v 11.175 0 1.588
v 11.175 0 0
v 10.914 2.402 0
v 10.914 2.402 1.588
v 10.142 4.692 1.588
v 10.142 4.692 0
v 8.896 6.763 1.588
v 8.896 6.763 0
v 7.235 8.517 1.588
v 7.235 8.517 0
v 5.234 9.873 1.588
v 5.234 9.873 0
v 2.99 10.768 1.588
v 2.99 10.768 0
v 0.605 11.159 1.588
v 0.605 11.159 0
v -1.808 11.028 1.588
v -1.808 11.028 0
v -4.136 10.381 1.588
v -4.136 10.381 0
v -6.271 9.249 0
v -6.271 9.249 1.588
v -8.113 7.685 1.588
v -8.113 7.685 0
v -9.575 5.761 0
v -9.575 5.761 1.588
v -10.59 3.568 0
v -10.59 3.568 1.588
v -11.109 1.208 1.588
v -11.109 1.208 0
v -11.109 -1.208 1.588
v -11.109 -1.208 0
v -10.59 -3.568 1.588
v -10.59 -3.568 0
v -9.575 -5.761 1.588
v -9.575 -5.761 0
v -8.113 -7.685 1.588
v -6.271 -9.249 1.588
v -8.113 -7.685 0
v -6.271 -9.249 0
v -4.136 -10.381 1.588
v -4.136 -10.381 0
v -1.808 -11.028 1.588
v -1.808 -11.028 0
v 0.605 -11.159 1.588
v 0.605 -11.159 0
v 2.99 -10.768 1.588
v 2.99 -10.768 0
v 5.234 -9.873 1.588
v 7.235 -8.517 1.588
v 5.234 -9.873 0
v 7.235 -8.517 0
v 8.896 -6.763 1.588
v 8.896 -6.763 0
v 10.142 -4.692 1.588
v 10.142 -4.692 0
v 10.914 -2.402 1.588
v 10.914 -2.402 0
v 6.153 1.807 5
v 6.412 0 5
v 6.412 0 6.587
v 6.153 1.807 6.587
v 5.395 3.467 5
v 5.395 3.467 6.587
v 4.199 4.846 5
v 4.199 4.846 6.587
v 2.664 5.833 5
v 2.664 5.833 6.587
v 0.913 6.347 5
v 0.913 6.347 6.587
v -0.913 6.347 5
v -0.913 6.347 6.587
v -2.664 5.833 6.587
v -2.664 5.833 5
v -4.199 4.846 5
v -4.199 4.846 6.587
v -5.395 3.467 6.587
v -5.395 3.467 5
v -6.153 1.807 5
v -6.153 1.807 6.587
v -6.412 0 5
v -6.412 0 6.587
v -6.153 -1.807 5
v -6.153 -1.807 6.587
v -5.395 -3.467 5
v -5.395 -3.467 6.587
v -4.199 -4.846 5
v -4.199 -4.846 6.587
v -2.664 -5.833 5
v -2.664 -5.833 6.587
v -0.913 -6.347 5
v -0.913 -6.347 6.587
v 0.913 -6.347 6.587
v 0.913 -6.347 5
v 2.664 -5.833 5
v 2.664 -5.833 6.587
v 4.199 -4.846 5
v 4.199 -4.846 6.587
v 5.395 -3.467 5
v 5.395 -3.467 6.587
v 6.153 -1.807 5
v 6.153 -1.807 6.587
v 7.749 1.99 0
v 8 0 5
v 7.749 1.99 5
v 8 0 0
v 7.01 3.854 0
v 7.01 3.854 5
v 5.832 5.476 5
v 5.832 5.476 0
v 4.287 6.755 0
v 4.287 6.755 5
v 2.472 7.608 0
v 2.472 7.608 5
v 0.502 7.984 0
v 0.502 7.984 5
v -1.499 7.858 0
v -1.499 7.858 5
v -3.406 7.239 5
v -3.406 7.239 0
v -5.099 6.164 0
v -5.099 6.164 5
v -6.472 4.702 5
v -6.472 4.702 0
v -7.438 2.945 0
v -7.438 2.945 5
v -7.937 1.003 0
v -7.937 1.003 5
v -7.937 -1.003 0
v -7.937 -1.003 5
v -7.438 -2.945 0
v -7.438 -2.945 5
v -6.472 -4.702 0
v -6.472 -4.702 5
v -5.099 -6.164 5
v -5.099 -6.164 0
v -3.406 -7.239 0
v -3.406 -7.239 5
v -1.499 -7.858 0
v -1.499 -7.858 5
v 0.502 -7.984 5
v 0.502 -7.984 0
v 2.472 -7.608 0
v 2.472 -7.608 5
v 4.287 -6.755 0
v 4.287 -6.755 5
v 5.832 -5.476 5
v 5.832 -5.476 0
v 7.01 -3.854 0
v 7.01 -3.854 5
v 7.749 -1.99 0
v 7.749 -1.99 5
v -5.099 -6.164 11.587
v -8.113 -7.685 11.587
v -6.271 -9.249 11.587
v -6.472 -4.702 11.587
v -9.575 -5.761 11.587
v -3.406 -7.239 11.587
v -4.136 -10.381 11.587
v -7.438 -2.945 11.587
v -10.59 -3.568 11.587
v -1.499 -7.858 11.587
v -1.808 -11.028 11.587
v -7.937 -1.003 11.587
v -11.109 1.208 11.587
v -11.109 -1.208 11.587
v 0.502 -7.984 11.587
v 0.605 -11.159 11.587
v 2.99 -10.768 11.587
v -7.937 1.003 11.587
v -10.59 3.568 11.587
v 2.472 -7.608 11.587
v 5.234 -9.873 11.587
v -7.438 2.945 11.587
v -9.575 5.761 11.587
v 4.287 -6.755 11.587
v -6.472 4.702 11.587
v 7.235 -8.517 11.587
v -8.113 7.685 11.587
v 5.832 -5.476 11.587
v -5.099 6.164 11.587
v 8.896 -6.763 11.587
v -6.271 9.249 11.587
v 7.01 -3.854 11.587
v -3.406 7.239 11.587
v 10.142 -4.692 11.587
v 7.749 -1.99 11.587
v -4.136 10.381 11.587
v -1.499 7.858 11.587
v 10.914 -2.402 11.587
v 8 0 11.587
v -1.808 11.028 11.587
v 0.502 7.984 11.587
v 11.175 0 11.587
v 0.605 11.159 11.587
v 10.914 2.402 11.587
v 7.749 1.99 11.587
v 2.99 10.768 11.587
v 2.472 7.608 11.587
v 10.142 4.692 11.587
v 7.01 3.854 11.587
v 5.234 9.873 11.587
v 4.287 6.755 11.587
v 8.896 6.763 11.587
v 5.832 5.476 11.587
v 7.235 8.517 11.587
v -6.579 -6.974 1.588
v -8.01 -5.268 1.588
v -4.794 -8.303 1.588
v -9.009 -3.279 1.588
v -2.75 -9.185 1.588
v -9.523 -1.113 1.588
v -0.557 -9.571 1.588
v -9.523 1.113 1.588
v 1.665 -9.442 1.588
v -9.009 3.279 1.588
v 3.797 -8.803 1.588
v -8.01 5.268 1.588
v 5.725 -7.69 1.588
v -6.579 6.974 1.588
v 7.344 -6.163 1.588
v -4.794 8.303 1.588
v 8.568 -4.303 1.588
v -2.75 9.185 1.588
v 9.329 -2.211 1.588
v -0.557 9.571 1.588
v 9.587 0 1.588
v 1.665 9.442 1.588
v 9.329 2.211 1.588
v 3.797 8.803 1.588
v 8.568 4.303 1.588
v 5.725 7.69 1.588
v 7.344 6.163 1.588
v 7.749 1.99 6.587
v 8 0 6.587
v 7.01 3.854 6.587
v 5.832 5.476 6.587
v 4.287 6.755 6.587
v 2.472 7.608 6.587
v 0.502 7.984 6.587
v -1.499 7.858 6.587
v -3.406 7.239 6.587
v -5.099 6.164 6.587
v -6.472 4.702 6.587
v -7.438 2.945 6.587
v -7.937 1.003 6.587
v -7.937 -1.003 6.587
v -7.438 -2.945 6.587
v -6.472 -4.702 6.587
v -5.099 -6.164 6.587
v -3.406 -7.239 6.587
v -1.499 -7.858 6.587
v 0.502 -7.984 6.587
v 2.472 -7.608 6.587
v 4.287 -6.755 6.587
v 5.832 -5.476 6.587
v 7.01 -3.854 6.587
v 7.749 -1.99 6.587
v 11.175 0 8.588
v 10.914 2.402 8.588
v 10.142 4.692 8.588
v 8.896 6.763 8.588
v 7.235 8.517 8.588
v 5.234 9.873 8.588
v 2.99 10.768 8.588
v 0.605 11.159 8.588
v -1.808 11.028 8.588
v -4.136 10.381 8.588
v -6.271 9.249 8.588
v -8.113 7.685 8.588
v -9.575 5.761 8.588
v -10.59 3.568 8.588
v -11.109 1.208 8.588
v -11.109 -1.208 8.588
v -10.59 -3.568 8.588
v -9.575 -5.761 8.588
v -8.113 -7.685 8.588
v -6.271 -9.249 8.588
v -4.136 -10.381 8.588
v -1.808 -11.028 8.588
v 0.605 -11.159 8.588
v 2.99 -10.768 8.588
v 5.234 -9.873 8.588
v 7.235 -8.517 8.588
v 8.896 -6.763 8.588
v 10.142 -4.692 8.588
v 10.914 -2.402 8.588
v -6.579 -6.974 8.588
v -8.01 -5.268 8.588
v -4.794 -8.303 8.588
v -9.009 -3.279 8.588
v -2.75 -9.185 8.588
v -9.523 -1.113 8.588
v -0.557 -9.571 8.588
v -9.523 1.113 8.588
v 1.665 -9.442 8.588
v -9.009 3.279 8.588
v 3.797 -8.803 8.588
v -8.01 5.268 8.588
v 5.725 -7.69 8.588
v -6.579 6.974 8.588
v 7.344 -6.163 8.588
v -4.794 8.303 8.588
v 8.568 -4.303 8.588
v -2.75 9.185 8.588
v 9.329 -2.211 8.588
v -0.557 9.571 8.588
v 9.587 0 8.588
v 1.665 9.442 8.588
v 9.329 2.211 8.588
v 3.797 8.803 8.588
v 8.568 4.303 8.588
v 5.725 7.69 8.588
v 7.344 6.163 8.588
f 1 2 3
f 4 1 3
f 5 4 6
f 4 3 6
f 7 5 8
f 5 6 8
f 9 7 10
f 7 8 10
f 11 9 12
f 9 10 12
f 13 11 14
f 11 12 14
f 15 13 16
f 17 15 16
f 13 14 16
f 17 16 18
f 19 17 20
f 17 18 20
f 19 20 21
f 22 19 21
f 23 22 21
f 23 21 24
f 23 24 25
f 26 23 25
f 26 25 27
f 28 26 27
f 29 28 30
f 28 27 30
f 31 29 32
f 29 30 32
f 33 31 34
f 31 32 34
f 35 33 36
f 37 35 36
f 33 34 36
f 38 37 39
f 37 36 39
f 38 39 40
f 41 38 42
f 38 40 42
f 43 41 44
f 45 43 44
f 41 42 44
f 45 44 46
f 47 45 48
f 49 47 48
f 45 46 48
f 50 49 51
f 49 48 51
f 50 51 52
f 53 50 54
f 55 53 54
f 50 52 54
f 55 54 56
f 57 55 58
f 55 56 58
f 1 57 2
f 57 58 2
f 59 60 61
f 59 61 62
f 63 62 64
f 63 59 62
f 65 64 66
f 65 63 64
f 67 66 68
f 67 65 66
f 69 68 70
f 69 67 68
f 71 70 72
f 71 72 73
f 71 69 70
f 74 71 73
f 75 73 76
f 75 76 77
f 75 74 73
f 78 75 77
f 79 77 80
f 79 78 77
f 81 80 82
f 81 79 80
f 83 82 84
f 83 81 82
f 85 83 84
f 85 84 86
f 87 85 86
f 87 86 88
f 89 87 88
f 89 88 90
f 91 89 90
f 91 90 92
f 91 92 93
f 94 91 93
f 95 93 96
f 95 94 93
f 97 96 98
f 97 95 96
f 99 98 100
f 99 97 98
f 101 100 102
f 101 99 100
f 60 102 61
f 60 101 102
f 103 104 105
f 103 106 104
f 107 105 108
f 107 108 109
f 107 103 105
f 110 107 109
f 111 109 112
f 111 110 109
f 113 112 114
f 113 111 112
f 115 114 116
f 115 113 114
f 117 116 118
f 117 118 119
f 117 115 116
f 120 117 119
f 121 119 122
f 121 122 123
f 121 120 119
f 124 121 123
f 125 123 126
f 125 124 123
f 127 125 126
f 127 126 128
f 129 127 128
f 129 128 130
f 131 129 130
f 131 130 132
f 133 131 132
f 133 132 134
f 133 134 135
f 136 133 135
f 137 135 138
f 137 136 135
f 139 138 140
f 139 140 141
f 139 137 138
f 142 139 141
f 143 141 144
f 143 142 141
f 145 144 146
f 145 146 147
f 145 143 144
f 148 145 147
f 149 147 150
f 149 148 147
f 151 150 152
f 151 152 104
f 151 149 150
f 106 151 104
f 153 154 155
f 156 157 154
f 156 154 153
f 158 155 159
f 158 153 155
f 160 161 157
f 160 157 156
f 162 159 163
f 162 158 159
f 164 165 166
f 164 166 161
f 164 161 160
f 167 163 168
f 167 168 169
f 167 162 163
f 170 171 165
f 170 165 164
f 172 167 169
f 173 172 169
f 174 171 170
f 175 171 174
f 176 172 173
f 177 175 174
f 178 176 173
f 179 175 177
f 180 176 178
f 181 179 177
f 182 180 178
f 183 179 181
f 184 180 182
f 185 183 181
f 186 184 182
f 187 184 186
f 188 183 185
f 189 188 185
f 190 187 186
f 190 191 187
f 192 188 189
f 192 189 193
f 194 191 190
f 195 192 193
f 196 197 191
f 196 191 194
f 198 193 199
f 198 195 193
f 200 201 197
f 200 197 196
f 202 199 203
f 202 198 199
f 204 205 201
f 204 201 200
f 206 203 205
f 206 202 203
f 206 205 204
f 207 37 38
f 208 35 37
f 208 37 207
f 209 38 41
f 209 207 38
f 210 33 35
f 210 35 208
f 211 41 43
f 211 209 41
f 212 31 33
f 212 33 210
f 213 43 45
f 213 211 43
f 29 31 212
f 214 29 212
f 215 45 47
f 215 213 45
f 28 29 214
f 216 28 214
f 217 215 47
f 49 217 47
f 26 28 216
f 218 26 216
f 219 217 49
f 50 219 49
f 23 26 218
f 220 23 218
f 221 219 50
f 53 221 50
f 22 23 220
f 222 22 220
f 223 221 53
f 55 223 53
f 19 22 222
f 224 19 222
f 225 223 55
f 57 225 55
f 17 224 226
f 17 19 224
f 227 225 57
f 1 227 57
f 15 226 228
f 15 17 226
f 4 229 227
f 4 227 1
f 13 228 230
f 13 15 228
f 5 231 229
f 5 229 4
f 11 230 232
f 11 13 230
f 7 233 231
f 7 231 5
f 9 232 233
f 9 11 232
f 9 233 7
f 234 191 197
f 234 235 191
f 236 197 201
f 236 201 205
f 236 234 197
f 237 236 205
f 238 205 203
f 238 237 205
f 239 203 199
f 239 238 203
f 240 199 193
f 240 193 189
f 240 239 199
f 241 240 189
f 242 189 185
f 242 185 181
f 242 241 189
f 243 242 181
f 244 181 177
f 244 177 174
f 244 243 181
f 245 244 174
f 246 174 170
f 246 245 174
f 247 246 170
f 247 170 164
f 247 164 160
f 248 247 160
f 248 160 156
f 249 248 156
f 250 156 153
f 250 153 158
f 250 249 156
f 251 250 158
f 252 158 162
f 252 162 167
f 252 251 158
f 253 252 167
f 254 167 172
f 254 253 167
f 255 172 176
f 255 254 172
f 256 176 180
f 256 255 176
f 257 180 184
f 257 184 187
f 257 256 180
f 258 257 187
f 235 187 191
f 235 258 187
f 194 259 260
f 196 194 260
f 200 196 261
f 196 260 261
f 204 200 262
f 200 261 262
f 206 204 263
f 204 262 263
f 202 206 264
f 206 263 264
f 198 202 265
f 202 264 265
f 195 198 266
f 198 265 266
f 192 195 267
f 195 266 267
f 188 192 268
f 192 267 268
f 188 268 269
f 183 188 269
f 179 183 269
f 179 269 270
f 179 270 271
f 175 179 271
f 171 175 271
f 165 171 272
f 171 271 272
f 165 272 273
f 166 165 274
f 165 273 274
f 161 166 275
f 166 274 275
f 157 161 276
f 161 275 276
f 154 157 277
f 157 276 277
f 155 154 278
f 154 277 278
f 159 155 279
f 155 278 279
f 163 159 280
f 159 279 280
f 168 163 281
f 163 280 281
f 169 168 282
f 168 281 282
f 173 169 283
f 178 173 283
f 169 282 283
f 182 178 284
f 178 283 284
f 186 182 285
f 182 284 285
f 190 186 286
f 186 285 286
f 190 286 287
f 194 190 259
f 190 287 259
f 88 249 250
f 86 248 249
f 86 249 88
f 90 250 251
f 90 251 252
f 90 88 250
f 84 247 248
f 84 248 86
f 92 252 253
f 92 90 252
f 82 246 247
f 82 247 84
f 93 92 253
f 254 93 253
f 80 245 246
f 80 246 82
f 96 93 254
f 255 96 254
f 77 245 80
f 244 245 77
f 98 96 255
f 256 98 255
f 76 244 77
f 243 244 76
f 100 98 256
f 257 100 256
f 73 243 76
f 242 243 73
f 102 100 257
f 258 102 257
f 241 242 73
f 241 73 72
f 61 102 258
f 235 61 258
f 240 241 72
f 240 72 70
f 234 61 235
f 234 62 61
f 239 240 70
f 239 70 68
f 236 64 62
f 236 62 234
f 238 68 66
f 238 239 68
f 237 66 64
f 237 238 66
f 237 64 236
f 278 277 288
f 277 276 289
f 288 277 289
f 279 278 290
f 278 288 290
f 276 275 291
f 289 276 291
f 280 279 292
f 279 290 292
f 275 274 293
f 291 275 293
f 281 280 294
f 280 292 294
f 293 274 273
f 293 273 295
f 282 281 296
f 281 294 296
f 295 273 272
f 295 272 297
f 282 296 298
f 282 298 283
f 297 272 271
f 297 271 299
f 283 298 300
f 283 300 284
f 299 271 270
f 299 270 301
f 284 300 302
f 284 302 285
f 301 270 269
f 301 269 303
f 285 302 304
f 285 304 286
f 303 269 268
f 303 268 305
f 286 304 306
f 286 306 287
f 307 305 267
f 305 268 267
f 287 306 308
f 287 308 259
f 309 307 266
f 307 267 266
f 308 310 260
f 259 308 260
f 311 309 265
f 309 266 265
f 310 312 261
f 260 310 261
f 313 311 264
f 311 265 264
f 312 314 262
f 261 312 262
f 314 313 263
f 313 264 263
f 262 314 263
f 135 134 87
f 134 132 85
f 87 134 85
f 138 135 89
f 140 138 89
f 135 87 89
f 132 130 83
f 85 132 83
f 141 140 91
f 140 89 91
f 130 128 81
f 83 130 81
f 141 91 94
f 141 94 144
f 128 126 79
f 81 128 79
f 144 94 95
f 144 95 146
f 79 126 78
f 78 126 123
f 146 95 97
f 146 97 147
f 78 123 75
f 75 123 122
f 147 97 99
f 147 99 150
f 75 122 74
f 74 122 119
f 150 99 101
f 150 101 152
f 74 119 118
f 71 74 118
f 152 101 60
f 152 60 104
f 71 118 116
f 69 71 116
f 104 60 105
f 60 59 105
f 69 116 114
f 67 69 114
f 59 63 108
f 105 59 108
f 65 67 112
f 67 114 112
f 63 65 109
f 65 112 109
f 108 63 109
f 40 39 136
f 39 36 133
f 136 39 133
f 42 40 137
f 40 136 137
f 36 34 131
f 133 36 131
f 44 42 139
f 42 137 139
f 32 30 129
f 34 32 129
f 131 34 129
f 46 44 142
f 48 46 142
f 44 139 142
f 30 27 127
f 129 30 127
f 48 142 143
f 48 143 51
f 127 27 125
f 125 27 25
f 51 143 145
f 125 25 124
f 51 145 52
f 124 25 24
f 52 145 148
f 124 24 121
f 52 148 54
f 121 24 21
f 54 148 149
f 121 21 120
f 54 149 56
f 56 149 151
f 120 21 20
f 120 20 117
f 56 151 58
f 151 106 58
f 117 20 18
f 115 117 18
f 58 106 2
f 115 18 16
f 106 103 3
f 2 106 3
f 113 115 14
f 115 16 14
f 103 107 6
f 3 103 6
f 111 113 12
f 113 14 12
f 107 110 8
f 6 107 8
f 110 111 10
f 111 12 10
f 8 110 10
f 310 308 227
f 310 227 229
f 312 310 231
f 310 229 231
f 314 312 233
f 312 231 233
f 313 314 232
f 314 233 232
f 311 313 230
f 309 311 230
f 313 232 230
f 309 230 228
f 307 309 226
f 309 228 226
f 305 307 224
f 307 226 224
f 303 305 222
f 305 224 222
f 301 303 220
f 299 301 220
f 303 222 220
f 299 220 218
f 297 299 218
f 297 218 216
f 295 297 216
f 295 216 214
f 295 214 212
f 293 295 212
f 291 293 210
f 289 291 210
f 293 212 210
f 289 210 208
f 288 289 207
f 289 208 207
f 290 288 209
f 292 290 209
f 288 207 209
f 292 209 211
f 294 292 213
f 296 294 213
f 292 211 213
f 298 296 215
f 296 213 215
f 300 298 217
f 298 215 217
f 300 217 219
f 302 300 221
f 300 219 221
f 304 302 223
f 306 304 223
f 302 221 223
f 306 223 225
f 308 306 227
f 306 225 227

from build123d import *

# Parameters (mm, degrees)
F0_R     = 11.1749967
F0_R_2   = 8
F1_DEPTH = 1.5875
F2_R     = 9.5874967
F2_R_2   = 8
F3_DEPTH = 3.41249
F4_R     = 9.5874967
F4_R_2   = 6.4124967
F5_DEPTH = 1.5875
F6_R     = 9.5874967
F6_R_2   = 8
F7_DEPTH = 2.0000214
F8_R     = 11.1749967
F8_R_2   = 8
F9_DEPTH = 2.9999686


with BuildPart() as f1:
    # F0 (on Top) → F1 (new body)
    with BuildSketch(Plane.XY):
        Circle(F0_R)
        Circle(F0_R_2, mode=Mode.SUBTRACT)
    extrude(amount=F1_DEPTH)

    # F2 (on face) → F3 (join)
    with BuildSketch(Plane.XY.offset(1.5875)):
        Circle(F2_R)
        Circle(F2_R_2, mode=Mode.SUBTRACT)
    extrude(amount=F3_DEPTH)

    # F4 (on face) → F5 (join)
    with BuildSketch(Plane.XY.offset(4.99999)):
        Circle(F4_R)
        Circle(F4_R_2, mode=Mode.SUBTRACT)
    extrude(amount=F5_DEPTH)

    # F6 (on face) → F7 (join)
    with BuildSketch(Plane.XY.offset(6.58749)):
        Circle(F6_R)
        Circle(F6_R_2, mode=Mode.SUBTRACT)
    extrude(amount=F7_DEPTH)

    # F8 (on face) → F9 (join)
    with BuildSketch(Plane.XY.offset(8.5875114)):
        Circle(F8_R)
        Circle(F8_R_2, mode=Mode.SUBTRACT)
    extrude(amount=F9_DEPTH)


solid = f1.part
